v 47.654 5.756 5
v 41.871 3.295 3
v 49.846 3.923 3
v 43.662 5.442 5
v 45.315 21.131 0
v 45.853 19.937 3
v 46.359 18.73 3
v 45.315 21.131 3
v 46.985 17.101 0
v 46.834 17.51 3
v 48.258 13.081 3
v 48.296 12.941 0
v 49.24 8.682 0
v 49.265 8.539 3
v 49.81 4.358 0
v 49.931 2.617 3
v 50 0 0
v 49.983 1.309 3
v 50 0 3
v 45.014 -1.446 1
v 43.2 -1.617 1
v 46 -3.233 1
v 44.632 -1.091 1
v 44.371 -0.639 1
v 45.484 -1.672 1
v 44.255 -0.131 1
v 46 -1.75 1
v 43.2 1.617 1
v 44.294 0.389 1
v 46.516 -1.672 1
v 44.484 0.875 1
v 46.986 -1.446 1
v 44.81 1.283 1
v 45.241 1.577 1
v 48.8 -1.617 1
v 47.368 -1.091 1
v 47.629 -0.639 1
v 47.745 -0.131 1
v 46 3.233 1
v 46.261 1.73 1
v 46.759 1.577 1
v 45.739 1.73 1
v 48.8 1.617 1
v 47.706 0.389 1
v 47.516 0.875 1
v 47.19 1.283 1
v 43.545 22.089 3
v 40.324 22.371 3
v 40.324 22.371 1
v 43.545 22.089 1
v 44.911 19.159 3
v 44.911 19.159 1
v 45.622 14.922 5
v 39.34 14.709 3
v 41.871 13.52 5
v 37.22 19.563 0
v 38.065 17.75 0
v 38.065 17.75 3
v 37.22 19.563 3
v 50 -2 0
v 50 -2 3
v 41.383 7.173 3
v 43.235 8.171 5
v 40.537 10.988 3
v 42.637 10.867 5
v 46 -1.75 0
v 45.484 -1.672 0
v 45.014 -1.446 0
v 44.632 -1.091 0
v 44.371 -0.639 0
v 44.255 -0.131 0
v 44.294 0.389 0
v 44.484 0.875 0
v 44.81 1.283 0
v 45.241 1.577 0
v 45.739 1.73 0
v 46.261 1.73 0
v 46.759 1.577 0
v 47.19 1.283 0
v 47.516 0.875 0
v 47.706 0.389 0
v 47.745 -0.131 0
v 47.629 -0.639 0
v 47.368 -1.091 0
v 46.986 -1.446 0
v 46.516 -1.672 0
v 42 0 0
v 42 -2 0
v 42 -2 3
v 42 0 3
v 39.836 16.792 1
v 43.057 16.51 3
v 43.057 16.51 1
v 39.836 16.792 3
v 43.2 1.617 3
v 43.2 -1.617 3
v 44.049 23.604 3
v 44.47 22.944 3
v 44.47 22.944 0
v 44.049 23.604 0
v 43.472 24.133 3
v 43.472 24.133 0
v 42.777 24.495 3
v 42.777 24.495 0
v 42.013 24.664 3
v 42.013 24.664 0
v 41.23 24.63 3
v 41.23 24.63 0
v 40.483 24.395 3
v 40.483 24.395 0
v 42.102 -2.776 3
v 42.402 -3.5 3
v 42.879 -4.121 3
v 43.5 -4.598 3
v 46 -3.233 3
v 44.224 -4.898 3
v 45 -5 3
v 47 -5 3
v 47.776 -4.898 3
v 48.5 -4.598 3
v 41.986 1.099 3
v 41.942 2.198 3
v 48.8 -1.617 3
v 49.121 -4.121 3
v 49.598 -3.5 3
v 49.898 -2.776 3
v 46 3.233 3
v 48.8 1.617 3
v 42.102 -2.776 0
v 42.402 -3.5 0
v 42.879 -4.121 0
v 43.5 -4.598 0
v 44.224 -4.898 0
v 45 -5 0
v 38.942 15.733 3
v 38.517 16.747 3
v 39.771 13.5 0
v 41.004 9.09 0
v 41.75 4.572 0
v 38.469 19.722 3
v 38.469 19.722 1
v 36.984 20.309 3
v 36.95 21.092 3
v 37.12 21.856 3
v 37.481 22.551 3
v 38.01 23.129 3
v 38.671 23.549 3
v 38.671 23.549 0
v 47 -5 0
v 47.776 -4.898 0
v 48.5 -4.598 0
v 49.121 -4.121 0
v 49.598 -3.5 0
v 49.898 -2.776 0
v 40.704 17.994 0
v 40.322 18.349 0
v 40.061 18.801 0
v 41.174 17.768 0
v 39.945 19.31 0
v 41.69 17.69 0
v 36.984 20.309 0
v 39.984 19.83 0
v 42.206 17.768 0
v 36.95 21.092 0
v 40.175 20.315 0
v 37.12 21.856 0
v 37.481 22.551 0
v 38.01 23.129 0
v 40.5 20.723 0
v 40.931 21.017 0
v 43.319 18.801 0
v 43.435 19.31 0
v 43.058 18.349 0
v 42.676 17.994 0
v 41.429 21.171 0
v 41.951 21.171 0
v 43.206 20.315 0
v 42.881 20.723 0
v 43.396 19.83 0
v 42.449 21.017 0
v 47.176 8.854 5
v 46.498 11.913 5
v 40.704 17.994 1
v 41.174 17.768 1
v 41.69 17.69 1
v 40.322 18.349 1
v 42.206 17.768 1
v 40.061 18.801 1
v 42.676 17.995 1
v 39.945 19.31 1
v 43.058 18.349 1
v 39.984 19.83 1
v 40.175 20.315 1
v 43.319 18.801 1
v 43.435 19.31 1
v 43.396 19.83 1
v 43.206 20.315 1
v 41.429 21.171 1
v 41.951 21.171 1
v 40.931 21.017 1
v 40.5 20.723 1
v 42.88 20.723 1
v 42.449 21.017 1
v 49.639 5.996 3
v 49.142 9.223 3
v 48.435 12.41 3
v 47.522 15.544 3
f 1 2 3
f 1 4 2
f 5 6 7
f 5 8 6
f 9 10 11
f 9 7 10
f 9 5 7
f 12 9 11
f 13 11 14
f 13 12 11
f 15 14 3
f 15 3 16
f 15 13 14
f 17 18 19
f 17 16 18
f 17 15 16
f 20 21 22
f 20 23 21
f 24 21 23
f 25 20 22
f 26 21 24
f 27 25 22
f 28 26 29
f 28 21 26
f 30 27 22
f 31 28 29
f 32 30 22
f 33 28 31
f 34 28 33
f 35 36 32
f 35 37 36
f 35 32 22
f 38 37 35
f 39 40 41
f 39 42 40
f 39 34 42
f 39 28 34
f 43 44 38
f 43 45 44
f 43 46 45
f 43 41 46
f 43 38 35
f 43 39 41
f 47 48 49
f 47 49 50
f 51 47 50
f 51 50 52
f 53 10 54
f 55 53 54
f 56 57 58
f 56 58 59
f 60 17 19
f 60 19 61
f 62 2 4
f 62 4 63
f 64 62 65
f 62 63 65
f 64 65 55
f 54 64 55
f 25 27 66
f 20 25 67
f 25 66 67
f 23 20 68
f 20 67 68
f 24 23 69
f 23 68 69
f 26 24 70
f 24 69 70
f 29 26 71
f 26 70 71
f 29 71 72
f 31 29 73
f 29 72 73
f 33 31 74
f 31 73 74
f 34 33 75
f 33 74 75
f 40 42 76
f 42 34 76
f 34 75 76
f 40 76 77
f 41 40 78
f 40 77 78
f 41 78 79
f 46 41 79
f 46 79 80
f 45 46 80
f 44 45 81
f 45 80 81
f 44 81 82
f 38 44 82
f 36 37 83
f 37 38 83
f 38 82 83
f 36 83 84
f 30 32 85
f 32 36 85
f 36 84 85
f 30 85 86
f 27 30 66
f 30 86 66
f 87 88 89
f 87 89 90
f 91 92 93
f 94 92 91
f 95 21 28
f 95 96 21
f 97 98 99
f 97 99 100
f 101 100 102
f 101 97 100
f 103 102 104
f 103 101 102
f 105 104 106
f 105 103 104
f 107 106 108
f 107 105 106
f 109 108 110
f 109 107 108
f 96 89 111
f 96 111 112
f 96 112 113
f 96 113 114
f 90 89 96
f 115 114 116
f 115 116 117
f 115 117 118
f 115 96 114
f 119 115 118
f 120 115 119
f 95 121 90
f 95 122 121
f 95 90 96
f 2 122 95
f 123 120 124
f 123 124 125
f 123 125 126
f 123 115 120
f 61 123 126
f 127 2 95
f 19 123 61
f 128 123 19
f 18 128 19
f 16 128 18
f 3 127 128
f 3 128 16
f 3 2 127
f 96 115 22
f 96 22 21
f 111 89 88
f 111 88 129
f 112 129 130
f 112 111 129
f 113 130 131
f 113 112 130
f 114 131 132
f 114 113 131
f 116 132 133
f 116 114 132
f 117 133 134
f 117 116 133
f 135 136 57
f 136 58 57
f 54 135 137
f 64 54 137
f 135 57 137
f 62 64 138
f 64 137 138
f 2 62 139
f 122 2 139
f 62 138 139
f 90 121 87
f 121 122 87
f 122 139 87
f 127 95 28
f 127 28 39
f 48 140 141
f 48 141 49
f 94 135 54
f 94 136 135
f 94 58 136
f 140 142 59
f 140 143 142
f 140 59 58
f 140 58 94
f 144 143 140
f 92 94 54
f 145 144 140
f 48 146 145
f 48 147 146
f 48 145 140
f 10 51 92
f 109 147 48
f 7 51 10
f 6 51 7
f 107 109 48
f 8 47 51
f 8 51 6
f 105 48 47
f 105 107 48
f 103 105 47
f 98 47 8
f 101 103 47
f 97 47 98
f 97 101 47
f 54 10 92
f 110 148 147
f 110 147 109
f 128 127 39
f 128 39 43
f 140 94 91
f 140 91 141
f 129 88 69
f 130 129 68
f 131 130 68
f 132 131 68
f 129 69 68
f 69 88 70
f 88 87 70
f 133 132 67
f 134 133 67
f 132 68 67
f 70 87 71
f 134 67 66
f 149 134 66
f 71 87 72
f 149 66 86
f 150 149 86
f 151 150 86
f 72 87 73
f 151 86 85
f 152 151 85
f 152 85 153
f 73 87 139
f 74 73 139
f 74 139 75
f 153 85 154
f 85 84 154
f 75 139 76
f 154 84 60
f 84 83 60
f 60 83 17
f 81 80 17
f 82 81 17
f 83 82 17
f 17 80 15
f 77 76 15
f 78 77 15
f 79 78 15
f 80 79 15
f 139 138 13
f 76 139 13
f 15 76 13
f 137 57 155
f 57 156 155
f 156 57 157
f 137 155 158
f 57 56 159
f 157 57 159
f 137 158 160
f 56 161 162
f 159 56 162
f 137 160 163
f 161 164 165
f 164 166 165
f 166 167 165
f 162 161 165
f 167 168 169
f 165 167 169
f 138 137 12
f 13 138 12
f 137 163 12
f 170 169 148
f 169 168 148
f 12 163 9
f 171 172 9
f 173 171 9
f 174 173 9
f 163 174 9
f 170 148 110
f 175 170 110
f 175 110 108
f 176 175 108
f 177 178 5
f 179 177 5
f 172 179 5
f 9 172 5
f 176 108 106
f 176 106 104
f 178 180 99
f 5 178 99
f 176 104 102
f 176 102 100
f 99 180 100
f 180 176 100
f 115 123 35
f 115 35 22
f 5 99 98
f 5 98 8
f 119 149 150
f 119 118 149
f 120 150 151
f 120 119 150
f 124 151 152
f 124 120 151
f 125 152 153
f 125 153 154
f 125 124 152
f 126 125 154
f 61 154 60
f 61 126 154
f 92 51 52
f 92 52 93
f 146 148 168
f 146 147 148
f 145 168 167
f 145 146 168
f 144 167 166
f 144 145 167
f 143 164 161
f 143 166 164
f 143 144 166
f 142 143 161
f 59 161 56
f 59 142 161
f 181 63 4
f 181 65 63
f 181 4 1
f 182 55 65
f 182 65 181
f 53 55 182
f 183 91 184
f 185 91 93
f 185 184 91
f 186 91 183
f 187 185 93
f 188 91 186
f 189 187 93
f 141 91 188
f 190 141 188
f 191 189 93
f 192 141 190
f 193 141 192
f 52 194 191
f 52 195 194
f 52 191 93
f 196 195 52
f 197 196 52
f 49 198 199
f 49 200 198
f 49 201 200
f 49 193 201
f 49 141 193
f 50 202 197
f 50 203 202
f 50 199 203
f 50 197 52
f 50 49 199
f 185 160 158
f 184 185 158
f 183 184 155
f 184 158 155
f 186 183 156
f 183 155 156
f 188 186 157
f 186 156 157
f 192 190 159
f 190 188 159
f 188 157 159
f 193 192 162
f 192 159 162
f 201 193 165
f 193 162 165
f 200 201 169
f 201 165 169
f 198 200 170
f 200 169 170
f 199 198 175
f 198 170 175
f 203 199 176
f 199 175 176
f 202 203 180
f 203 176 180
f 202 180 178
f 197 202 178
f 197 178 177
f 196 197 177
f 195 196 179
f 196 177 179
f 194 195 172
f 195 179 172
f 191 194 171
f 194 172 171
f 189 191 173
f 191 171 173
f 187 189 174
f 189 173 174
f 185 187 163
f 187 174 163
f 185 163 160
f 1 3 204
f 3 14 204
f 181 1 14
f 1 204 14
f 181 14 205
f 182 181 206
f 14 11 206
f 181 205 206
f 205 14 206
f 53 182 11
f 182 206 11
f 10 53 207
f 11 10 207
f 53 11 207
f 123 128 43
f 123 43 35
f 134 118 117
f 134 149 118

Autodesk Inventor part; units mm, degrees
ref_plane "YZ Plane" through (0, 0, 0) normal (1, 0, 0) x (0, 1, 0)
ref_plane "XZ Plane" through (0, 0, 0) normal (0, 1, 0) x (-1, 0, 0)
sketch "スケッチ1" plane through (0, 0, 0) normal (0, 0, 1) x (1, 0, 0)
  arc A0 (46, 0) -> (41.6902, 19.4404) centre (0, 0) ccw construction
  line L0 (0, 0) -> (46, 0) construction
  line L1 (0, 0) -> (46, 0) construction
  line L2 (0, 0) -> (41.6902, 19.4404) construction
  arc A1 (50, 0) -> (45.3154, 21.1309) centre (0, 0) ccw
  arc A2 (42, 0) -> (38.0649, 17.75) centre (0, 0) ccw
  line L3 (42, 0) -> (50, 0)
  line L4 (50, 0) -> (50, -5)
  line L5 (50, -5) -> (42, -5)
  line L6 (42, -5) -> (42, 0)
  line L7 (45.3154, 21.1309) -> (38.0649, 17.75)
  line L8 (38.0649, 17.75) -> (35.9518, 22.2815)
  line L9 (35.9518, 22.2815) -> (43.2023, 25.6625)
  line L10 (43.2023, 25.6625) -> (45.3154, 21.1309)
  dimension "d0" = 46
  dimension "d1" = 0
  dimension "d2" = 25
  dimension "d3" = 4
  dimension "d4" = 4
  dimension "d5" = 8
  dimension "d6" = 5
  dimension "d7" = 5
extrude "押し出し1" add sketch "スケッチ1" along normal blind 3
sketch "スケッチ2" plane through (0, 0, 3) normal (0, 0, 1) x (1, 0, 0)
  arc A0 (46, 0) -> (41.6902, 19.4404) centre (0, 0) ccw construction
  line L0 (0, 0) -> (46, 0) construction
  line L1 (0, 0) -> (46, 0) construction
  line L2 (0, 0) -> (41.6902, 19.4404) construction
  dimension "d10" = 46
  dimension "d11" = 0
  dimension "d12" = 25
hole "穴1" at (41.6902, 19.4404, 3) at (46, 0, 3) direction (0, 0, -1) diameter 3.5 end through all
sketch "スケッチ3" plane through (0, 0, 3) normal (0, 0, 1) x (1, 0, 0)
  circle A0 centre (46, 0) radius 1.75 projected
  line L0 (46, 3.2332) -> (48.8, 1.6166)
  line L1 (48.8, 1.6166) -> (48.8, -1.6166)
  line L2 (48.8, -1.6166) -> (46, -3.2332)
  line L3 (46, -3.2332) -> (43.2, -1.6166)
  line L4 (43.2, -1.6166) -> (43.2, 1.6166)
  line L5 (43.2, 1.6166) -> (46, 3.2332)
  point P0 (0, 0)
  dimension "d20" = 5.6
extrude "押し出し2" cut sketch "スケッチ3" against normal blind 2
pattern_circular "円形状パターン1" count 2 over 25 about axis through (0, 0, -10) along (0, 0, 1) of "押し出し2"
ref_plane "作業平面1" through (-22.5535, -5, 3) normal (-0.2164396, 0.976296, 0) x (0, 0, -1)
sketch "スケッチ4" plane through (-22.5535, -5, 3) normal (-0.2164396, 0.976296, 0) x (0, 0, -1)
  line L0 (3, -73.1011) -> (0, -73.1011) projected
  line L1 (0, -65.1011) -> (3, -65.1011) projected
  line L2 (0, -65.1011) -> (0, -64.1056) projected
  line L3 (0, -73.1011) -> (0, -65.1011)
  line L4 (0, -65.1011) -> (-2, -67.1011)
  line L5 (-2, -67.1011) -> (-2, -71.1011)
  line L6 (0, -71.9159) -> (0, -73.1011) projected
  line L7 (-2, -71.1011) -> (0, -73.1011)
  line L8 (4, -23.1011) -> (-3, -23.1011) projected
  point P0 (3, -23.1011)
  dimension "d26" = 45
  dimension "d27" = 45
  dimension "d28" = 2
revolve "回転1" add sketch "スケッチ4" angle 16 mid plane about axis through (0, 0, -10) along (0, 0, 1)
chamfer "面取り1" distance 2 angle 45 2 edges at (43.0869, 16.1095, 5) (45.8582, 3.6091, 5)
fillet "フィレット1" radius 3 4 edges at (43.2023, 25.6625, 1.5) (35.9518, 22.2815, 1.5) (50, -5, 1.5) (42, -5, 1.5)
equation "\"d4\" = d3"
equation "\"d6\" = d7"
equation "\"d27\" = d26"
properties part number "3D_frame-connect-base2-2_3D プリント"
